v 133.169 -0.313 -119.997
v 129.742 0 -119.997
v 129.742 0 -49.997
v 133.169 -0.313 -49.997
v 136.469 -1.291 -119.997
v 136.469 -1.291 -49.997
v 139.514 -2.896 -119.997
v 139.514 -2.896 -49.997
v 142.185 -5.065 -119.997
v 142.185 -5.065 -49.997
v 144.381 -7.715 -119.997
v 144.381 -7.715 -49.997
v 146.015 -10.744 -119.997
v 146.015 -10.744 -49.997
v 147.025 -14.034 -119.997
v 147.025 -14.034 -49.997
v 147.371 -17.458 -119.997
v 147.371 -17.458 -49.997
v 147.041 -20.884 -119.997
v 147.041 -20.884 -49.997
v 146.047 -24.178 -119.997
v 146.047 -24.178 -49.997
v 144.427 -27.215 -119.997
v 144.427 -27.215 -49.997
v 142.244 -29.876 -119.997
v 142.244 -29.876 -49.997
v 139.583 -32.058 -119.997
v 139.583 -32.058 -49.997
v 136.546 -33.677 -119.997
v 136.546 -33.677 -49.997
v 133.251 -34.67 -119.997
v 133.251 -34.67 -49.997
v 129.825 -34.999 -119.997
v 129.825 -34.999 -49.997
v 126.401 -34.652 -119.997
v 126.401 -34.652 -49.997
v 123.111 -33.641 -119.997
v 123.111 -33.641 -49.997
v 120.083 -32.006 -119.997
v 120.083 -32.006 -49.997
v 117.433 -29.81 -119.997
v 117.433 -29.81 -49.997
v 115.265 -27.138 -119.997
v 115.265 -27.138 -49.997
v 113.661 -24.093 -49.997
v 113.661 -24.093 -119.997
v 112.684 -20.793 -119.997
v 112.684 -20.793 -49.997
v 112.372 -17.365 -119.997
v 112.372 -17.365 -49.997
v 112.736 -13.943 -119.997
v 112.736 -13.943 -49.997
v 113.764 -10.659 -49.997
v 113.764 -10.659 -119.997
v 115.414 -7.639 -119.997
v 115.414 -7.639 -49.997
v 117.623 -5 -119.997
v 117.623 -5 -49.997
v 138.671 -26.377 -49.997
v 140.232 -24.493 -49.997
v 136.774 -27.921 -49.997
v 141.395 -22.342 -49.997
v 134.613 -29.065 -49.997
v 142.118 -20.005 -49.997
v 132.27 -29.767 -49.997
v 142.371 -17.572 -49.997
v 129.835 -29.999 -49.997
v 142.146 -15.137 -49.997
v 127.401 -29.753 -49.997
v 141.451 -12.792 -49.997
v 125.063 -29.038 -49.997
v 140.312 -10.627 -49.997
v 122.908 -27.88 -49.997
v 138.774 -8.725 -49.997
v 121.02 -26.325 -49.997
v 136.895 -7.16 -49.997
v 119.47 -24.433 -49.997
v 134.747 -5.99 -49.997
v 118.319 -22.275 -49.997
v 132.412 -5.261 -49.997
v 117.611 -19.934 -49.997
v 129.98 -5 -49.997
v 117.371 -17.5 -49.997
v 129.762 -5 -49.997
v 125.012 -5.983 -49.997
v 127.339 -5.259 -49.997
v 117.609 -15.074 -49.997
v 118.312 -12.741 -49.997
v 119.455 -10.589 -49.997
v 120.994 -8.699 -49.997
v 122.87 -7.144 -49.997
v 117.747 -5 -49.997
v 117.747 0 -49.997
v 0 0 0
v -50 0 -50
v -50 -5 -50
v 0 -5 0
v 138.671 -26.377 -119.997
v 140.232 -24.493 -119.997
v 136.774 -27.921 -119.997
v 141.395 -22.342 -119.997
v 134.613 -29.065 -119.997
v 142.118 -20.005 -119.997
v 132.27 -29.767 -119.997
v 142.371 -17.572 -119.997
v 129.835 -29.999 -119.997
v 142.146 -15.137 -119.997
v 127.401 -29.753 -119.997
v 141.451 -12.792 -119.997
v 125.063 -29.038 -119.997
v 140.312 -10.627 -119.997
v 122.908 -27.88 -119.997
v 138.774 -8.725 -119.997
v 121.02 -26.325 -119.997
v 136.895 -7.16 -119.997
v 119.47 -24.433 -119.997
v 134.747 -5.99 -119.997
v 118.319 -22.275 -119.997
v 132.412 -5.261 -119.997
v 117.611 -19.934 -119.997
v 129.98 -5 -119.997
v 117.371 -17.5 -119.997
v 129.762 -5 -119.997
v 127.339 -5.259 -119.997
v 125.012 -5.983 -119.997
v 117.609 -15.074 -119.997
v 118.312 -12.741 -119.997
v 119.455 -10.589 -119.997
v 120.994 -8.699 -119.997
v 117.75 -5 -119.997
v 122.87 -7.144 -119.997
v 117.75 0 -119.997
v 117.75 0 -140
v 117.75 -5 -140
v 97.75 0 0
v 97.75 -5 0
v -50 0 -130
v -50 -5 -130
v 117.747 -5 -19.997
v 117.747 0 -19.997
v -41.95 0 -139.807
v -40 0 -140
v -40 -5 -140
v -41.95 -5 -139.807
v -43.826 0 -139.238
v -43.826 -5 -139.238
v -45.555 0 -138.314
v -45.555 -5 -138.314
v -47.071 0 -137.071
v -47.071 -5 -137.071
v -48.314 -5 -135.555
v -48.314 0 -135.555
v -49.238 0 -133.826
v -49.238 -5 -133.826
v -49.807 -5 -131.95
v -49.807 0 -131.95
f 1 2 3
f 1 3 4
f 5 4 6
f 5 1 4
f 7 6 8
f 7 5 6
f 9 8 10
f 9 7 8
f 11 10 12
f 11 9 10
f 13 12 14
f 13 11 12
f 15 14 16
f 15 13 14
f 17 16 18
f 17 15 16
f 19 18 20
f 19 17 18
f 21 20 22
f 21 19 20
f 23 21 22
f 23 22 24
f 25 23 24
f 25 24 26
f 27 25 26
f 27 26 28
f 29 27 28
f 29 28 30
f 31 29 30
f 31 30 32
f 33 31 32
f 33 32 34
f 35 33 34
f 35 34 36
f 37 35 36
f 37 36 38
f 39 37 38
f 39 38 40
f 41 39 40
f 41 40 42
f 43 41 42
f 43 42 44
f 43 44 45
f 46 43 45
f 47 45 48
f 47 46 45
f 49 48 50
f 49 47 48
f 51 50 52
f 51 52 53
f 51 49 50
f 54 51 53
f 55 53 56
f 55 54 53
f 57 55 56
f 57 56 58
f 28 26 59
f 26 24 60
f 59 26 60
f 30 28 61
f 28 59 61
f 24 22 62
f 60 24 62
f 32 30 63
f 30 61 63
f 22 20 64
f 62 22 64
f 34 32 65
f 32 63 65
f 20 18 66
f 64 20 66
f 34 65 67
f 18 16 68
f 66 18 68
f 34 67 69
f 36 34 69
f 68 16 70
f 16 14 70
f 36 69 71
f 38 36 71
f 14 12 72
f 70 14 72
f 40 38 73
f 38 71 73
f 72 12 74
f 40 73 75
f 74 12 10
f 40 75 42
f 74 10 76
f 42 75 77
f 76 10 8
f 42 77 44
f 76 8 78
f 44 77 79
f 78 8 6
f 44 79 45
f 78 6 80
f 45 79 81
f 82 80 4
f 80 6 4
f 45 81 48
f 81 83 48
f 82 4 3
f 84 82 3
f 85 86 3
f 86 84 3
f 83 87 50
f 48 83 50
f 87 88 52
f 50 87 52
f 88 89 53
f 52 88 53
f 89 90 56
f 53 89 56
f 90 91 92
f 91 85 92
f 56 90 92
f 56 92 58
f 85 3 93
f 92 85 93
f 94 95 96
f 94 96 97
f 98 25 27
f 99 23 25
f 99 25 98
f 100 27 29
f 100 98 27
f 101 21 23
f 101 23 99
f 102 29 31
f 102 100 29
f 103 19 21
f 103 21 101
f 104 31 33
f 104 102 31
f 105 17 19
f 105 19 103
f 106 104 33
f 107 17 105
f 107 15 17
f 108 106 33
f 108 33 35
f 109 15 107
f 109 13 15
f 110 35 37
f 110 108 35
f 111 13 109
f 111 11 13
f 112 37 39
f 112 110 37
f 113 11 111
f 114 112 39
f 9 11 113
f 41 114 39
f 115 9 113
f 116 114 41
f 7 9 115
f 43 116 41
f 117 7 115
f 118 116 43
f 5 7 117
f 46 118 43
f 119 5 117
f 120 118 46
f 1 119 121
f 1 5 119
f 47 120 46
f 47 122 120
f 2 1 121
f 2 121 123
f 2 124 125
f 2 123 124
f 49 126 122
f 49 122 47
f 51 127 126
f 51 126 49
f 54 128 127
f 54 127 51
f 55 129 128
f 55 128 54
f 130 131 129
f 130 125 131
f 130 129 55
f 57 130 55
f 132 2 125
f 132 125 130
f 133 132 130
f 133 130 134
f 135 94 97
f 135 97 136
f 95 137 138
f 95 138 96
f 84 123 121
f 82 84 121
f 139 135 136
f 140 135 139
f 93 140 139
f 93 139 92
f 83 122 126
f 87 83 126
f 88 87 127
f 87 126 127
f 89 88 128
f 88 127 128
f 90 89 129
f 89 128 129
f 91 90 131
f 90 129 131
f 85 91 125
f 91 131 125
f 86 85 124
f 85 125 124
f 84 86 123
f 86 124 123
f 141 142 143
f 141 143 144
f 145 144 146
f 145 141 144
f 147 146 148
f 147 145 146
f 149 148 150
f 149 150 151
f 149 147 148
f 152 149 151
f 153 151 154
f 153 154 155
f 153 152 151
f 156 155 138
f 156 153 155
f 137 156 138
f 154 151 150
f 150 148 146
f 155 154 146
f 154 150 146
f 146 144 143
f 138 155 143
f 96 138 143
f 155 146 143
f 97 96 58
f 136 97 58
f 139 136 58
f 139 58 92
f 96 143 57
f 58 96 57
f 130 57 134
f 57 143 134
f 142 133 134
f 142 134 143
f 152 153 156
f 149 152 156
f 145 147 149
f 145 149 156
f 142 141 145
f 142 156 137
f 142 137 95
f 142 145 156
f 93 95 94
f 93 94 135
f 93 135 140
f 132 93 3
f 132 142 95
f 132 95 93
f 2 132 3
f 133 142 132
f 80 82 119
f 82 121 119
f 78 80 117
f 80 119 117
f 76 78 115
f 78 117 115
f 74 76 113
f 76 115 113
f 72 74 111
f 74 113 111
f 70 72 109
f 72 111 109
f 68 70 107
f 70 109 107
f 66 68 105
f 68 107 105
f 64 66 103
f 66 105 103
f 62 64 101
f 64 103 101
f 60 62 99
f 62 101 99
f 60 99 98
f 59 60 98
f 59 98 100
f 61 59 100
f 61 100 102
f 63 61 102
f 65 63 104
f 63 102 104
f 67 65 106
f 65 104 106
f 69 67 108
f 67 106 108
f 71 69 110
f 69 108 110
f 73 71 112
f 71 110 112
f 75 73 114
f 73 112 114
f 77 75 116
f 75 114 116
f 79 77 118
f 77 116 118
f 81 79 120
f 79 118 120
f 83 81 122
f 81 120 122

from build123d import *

# Parameters (mm, degrees)
BOSS_EXTRUDE1_DEPTH = 5
SKETCH3_R           = 17.5
SKETCH3_R_2         = 12.5
BOSS_EXTRUDE2_DEPTH = 70


with BuildPart() as part:
    # Sketch1 → Boss-Extrude1 (new body)
    with BuildSketch(Plane(origin=(0, 0, 0), x_dir=(1, 0, 0), z_dir=(0, 1, 0))):
        with BuildLine():
            Line((0, 0), (97.75, 0))
            Line((97.75, 0), (117.746979772, 19.996979772))
            Line((117.746979772, 19.996979772), (117.746979772, 49.996979772))
            Line((117.746979772, 49.996979772), (130.000479502, 49.996979772))
            Line((130.000479502, 49.996979772), (130.000479502, 119.996979772))
            Line((130.000479502, 119.996979772), (117.750479502, 119.996979772))
            Line((117.750479502, 119.996979772), (117.750479502, 139.999520498))
            Line((117.750479502, 139.999520498), (-39.999520498, 139.999520498))
            ThreePointArc((-39.999520498, 139.999520498), (-47.07058831, 137.07058831), (-49.999520498, 129.999520498))
            Line((-49.999520498, 129.999520498), (-49.999520498, 49.999520498))
            Line((-49.999520498, 49.999520498), (0, 0))
        make_face()
    extrude(amount=-BOSS_EXTRUDE1_DEPTH)

    # Sketch3 → Boss-Extrude2 (add)
    with BuildSketch(Plane(origin=(0, 0, -119.996979772), x_dir=(-1, 0, 0), z_dir=(0, 0, -1))):
        with Locations((-129.871326169, -17.499523405)):
            Circle(SKETCH3_R)
        with Locations((-129.871326169, -17.499523405)):
            Circle(SKETCH3_R_2, mode=Mode.SUBTRACT)
    extrude(amount=-BOSS_EXTRUDE2_DEPTH)


solid = part.part
